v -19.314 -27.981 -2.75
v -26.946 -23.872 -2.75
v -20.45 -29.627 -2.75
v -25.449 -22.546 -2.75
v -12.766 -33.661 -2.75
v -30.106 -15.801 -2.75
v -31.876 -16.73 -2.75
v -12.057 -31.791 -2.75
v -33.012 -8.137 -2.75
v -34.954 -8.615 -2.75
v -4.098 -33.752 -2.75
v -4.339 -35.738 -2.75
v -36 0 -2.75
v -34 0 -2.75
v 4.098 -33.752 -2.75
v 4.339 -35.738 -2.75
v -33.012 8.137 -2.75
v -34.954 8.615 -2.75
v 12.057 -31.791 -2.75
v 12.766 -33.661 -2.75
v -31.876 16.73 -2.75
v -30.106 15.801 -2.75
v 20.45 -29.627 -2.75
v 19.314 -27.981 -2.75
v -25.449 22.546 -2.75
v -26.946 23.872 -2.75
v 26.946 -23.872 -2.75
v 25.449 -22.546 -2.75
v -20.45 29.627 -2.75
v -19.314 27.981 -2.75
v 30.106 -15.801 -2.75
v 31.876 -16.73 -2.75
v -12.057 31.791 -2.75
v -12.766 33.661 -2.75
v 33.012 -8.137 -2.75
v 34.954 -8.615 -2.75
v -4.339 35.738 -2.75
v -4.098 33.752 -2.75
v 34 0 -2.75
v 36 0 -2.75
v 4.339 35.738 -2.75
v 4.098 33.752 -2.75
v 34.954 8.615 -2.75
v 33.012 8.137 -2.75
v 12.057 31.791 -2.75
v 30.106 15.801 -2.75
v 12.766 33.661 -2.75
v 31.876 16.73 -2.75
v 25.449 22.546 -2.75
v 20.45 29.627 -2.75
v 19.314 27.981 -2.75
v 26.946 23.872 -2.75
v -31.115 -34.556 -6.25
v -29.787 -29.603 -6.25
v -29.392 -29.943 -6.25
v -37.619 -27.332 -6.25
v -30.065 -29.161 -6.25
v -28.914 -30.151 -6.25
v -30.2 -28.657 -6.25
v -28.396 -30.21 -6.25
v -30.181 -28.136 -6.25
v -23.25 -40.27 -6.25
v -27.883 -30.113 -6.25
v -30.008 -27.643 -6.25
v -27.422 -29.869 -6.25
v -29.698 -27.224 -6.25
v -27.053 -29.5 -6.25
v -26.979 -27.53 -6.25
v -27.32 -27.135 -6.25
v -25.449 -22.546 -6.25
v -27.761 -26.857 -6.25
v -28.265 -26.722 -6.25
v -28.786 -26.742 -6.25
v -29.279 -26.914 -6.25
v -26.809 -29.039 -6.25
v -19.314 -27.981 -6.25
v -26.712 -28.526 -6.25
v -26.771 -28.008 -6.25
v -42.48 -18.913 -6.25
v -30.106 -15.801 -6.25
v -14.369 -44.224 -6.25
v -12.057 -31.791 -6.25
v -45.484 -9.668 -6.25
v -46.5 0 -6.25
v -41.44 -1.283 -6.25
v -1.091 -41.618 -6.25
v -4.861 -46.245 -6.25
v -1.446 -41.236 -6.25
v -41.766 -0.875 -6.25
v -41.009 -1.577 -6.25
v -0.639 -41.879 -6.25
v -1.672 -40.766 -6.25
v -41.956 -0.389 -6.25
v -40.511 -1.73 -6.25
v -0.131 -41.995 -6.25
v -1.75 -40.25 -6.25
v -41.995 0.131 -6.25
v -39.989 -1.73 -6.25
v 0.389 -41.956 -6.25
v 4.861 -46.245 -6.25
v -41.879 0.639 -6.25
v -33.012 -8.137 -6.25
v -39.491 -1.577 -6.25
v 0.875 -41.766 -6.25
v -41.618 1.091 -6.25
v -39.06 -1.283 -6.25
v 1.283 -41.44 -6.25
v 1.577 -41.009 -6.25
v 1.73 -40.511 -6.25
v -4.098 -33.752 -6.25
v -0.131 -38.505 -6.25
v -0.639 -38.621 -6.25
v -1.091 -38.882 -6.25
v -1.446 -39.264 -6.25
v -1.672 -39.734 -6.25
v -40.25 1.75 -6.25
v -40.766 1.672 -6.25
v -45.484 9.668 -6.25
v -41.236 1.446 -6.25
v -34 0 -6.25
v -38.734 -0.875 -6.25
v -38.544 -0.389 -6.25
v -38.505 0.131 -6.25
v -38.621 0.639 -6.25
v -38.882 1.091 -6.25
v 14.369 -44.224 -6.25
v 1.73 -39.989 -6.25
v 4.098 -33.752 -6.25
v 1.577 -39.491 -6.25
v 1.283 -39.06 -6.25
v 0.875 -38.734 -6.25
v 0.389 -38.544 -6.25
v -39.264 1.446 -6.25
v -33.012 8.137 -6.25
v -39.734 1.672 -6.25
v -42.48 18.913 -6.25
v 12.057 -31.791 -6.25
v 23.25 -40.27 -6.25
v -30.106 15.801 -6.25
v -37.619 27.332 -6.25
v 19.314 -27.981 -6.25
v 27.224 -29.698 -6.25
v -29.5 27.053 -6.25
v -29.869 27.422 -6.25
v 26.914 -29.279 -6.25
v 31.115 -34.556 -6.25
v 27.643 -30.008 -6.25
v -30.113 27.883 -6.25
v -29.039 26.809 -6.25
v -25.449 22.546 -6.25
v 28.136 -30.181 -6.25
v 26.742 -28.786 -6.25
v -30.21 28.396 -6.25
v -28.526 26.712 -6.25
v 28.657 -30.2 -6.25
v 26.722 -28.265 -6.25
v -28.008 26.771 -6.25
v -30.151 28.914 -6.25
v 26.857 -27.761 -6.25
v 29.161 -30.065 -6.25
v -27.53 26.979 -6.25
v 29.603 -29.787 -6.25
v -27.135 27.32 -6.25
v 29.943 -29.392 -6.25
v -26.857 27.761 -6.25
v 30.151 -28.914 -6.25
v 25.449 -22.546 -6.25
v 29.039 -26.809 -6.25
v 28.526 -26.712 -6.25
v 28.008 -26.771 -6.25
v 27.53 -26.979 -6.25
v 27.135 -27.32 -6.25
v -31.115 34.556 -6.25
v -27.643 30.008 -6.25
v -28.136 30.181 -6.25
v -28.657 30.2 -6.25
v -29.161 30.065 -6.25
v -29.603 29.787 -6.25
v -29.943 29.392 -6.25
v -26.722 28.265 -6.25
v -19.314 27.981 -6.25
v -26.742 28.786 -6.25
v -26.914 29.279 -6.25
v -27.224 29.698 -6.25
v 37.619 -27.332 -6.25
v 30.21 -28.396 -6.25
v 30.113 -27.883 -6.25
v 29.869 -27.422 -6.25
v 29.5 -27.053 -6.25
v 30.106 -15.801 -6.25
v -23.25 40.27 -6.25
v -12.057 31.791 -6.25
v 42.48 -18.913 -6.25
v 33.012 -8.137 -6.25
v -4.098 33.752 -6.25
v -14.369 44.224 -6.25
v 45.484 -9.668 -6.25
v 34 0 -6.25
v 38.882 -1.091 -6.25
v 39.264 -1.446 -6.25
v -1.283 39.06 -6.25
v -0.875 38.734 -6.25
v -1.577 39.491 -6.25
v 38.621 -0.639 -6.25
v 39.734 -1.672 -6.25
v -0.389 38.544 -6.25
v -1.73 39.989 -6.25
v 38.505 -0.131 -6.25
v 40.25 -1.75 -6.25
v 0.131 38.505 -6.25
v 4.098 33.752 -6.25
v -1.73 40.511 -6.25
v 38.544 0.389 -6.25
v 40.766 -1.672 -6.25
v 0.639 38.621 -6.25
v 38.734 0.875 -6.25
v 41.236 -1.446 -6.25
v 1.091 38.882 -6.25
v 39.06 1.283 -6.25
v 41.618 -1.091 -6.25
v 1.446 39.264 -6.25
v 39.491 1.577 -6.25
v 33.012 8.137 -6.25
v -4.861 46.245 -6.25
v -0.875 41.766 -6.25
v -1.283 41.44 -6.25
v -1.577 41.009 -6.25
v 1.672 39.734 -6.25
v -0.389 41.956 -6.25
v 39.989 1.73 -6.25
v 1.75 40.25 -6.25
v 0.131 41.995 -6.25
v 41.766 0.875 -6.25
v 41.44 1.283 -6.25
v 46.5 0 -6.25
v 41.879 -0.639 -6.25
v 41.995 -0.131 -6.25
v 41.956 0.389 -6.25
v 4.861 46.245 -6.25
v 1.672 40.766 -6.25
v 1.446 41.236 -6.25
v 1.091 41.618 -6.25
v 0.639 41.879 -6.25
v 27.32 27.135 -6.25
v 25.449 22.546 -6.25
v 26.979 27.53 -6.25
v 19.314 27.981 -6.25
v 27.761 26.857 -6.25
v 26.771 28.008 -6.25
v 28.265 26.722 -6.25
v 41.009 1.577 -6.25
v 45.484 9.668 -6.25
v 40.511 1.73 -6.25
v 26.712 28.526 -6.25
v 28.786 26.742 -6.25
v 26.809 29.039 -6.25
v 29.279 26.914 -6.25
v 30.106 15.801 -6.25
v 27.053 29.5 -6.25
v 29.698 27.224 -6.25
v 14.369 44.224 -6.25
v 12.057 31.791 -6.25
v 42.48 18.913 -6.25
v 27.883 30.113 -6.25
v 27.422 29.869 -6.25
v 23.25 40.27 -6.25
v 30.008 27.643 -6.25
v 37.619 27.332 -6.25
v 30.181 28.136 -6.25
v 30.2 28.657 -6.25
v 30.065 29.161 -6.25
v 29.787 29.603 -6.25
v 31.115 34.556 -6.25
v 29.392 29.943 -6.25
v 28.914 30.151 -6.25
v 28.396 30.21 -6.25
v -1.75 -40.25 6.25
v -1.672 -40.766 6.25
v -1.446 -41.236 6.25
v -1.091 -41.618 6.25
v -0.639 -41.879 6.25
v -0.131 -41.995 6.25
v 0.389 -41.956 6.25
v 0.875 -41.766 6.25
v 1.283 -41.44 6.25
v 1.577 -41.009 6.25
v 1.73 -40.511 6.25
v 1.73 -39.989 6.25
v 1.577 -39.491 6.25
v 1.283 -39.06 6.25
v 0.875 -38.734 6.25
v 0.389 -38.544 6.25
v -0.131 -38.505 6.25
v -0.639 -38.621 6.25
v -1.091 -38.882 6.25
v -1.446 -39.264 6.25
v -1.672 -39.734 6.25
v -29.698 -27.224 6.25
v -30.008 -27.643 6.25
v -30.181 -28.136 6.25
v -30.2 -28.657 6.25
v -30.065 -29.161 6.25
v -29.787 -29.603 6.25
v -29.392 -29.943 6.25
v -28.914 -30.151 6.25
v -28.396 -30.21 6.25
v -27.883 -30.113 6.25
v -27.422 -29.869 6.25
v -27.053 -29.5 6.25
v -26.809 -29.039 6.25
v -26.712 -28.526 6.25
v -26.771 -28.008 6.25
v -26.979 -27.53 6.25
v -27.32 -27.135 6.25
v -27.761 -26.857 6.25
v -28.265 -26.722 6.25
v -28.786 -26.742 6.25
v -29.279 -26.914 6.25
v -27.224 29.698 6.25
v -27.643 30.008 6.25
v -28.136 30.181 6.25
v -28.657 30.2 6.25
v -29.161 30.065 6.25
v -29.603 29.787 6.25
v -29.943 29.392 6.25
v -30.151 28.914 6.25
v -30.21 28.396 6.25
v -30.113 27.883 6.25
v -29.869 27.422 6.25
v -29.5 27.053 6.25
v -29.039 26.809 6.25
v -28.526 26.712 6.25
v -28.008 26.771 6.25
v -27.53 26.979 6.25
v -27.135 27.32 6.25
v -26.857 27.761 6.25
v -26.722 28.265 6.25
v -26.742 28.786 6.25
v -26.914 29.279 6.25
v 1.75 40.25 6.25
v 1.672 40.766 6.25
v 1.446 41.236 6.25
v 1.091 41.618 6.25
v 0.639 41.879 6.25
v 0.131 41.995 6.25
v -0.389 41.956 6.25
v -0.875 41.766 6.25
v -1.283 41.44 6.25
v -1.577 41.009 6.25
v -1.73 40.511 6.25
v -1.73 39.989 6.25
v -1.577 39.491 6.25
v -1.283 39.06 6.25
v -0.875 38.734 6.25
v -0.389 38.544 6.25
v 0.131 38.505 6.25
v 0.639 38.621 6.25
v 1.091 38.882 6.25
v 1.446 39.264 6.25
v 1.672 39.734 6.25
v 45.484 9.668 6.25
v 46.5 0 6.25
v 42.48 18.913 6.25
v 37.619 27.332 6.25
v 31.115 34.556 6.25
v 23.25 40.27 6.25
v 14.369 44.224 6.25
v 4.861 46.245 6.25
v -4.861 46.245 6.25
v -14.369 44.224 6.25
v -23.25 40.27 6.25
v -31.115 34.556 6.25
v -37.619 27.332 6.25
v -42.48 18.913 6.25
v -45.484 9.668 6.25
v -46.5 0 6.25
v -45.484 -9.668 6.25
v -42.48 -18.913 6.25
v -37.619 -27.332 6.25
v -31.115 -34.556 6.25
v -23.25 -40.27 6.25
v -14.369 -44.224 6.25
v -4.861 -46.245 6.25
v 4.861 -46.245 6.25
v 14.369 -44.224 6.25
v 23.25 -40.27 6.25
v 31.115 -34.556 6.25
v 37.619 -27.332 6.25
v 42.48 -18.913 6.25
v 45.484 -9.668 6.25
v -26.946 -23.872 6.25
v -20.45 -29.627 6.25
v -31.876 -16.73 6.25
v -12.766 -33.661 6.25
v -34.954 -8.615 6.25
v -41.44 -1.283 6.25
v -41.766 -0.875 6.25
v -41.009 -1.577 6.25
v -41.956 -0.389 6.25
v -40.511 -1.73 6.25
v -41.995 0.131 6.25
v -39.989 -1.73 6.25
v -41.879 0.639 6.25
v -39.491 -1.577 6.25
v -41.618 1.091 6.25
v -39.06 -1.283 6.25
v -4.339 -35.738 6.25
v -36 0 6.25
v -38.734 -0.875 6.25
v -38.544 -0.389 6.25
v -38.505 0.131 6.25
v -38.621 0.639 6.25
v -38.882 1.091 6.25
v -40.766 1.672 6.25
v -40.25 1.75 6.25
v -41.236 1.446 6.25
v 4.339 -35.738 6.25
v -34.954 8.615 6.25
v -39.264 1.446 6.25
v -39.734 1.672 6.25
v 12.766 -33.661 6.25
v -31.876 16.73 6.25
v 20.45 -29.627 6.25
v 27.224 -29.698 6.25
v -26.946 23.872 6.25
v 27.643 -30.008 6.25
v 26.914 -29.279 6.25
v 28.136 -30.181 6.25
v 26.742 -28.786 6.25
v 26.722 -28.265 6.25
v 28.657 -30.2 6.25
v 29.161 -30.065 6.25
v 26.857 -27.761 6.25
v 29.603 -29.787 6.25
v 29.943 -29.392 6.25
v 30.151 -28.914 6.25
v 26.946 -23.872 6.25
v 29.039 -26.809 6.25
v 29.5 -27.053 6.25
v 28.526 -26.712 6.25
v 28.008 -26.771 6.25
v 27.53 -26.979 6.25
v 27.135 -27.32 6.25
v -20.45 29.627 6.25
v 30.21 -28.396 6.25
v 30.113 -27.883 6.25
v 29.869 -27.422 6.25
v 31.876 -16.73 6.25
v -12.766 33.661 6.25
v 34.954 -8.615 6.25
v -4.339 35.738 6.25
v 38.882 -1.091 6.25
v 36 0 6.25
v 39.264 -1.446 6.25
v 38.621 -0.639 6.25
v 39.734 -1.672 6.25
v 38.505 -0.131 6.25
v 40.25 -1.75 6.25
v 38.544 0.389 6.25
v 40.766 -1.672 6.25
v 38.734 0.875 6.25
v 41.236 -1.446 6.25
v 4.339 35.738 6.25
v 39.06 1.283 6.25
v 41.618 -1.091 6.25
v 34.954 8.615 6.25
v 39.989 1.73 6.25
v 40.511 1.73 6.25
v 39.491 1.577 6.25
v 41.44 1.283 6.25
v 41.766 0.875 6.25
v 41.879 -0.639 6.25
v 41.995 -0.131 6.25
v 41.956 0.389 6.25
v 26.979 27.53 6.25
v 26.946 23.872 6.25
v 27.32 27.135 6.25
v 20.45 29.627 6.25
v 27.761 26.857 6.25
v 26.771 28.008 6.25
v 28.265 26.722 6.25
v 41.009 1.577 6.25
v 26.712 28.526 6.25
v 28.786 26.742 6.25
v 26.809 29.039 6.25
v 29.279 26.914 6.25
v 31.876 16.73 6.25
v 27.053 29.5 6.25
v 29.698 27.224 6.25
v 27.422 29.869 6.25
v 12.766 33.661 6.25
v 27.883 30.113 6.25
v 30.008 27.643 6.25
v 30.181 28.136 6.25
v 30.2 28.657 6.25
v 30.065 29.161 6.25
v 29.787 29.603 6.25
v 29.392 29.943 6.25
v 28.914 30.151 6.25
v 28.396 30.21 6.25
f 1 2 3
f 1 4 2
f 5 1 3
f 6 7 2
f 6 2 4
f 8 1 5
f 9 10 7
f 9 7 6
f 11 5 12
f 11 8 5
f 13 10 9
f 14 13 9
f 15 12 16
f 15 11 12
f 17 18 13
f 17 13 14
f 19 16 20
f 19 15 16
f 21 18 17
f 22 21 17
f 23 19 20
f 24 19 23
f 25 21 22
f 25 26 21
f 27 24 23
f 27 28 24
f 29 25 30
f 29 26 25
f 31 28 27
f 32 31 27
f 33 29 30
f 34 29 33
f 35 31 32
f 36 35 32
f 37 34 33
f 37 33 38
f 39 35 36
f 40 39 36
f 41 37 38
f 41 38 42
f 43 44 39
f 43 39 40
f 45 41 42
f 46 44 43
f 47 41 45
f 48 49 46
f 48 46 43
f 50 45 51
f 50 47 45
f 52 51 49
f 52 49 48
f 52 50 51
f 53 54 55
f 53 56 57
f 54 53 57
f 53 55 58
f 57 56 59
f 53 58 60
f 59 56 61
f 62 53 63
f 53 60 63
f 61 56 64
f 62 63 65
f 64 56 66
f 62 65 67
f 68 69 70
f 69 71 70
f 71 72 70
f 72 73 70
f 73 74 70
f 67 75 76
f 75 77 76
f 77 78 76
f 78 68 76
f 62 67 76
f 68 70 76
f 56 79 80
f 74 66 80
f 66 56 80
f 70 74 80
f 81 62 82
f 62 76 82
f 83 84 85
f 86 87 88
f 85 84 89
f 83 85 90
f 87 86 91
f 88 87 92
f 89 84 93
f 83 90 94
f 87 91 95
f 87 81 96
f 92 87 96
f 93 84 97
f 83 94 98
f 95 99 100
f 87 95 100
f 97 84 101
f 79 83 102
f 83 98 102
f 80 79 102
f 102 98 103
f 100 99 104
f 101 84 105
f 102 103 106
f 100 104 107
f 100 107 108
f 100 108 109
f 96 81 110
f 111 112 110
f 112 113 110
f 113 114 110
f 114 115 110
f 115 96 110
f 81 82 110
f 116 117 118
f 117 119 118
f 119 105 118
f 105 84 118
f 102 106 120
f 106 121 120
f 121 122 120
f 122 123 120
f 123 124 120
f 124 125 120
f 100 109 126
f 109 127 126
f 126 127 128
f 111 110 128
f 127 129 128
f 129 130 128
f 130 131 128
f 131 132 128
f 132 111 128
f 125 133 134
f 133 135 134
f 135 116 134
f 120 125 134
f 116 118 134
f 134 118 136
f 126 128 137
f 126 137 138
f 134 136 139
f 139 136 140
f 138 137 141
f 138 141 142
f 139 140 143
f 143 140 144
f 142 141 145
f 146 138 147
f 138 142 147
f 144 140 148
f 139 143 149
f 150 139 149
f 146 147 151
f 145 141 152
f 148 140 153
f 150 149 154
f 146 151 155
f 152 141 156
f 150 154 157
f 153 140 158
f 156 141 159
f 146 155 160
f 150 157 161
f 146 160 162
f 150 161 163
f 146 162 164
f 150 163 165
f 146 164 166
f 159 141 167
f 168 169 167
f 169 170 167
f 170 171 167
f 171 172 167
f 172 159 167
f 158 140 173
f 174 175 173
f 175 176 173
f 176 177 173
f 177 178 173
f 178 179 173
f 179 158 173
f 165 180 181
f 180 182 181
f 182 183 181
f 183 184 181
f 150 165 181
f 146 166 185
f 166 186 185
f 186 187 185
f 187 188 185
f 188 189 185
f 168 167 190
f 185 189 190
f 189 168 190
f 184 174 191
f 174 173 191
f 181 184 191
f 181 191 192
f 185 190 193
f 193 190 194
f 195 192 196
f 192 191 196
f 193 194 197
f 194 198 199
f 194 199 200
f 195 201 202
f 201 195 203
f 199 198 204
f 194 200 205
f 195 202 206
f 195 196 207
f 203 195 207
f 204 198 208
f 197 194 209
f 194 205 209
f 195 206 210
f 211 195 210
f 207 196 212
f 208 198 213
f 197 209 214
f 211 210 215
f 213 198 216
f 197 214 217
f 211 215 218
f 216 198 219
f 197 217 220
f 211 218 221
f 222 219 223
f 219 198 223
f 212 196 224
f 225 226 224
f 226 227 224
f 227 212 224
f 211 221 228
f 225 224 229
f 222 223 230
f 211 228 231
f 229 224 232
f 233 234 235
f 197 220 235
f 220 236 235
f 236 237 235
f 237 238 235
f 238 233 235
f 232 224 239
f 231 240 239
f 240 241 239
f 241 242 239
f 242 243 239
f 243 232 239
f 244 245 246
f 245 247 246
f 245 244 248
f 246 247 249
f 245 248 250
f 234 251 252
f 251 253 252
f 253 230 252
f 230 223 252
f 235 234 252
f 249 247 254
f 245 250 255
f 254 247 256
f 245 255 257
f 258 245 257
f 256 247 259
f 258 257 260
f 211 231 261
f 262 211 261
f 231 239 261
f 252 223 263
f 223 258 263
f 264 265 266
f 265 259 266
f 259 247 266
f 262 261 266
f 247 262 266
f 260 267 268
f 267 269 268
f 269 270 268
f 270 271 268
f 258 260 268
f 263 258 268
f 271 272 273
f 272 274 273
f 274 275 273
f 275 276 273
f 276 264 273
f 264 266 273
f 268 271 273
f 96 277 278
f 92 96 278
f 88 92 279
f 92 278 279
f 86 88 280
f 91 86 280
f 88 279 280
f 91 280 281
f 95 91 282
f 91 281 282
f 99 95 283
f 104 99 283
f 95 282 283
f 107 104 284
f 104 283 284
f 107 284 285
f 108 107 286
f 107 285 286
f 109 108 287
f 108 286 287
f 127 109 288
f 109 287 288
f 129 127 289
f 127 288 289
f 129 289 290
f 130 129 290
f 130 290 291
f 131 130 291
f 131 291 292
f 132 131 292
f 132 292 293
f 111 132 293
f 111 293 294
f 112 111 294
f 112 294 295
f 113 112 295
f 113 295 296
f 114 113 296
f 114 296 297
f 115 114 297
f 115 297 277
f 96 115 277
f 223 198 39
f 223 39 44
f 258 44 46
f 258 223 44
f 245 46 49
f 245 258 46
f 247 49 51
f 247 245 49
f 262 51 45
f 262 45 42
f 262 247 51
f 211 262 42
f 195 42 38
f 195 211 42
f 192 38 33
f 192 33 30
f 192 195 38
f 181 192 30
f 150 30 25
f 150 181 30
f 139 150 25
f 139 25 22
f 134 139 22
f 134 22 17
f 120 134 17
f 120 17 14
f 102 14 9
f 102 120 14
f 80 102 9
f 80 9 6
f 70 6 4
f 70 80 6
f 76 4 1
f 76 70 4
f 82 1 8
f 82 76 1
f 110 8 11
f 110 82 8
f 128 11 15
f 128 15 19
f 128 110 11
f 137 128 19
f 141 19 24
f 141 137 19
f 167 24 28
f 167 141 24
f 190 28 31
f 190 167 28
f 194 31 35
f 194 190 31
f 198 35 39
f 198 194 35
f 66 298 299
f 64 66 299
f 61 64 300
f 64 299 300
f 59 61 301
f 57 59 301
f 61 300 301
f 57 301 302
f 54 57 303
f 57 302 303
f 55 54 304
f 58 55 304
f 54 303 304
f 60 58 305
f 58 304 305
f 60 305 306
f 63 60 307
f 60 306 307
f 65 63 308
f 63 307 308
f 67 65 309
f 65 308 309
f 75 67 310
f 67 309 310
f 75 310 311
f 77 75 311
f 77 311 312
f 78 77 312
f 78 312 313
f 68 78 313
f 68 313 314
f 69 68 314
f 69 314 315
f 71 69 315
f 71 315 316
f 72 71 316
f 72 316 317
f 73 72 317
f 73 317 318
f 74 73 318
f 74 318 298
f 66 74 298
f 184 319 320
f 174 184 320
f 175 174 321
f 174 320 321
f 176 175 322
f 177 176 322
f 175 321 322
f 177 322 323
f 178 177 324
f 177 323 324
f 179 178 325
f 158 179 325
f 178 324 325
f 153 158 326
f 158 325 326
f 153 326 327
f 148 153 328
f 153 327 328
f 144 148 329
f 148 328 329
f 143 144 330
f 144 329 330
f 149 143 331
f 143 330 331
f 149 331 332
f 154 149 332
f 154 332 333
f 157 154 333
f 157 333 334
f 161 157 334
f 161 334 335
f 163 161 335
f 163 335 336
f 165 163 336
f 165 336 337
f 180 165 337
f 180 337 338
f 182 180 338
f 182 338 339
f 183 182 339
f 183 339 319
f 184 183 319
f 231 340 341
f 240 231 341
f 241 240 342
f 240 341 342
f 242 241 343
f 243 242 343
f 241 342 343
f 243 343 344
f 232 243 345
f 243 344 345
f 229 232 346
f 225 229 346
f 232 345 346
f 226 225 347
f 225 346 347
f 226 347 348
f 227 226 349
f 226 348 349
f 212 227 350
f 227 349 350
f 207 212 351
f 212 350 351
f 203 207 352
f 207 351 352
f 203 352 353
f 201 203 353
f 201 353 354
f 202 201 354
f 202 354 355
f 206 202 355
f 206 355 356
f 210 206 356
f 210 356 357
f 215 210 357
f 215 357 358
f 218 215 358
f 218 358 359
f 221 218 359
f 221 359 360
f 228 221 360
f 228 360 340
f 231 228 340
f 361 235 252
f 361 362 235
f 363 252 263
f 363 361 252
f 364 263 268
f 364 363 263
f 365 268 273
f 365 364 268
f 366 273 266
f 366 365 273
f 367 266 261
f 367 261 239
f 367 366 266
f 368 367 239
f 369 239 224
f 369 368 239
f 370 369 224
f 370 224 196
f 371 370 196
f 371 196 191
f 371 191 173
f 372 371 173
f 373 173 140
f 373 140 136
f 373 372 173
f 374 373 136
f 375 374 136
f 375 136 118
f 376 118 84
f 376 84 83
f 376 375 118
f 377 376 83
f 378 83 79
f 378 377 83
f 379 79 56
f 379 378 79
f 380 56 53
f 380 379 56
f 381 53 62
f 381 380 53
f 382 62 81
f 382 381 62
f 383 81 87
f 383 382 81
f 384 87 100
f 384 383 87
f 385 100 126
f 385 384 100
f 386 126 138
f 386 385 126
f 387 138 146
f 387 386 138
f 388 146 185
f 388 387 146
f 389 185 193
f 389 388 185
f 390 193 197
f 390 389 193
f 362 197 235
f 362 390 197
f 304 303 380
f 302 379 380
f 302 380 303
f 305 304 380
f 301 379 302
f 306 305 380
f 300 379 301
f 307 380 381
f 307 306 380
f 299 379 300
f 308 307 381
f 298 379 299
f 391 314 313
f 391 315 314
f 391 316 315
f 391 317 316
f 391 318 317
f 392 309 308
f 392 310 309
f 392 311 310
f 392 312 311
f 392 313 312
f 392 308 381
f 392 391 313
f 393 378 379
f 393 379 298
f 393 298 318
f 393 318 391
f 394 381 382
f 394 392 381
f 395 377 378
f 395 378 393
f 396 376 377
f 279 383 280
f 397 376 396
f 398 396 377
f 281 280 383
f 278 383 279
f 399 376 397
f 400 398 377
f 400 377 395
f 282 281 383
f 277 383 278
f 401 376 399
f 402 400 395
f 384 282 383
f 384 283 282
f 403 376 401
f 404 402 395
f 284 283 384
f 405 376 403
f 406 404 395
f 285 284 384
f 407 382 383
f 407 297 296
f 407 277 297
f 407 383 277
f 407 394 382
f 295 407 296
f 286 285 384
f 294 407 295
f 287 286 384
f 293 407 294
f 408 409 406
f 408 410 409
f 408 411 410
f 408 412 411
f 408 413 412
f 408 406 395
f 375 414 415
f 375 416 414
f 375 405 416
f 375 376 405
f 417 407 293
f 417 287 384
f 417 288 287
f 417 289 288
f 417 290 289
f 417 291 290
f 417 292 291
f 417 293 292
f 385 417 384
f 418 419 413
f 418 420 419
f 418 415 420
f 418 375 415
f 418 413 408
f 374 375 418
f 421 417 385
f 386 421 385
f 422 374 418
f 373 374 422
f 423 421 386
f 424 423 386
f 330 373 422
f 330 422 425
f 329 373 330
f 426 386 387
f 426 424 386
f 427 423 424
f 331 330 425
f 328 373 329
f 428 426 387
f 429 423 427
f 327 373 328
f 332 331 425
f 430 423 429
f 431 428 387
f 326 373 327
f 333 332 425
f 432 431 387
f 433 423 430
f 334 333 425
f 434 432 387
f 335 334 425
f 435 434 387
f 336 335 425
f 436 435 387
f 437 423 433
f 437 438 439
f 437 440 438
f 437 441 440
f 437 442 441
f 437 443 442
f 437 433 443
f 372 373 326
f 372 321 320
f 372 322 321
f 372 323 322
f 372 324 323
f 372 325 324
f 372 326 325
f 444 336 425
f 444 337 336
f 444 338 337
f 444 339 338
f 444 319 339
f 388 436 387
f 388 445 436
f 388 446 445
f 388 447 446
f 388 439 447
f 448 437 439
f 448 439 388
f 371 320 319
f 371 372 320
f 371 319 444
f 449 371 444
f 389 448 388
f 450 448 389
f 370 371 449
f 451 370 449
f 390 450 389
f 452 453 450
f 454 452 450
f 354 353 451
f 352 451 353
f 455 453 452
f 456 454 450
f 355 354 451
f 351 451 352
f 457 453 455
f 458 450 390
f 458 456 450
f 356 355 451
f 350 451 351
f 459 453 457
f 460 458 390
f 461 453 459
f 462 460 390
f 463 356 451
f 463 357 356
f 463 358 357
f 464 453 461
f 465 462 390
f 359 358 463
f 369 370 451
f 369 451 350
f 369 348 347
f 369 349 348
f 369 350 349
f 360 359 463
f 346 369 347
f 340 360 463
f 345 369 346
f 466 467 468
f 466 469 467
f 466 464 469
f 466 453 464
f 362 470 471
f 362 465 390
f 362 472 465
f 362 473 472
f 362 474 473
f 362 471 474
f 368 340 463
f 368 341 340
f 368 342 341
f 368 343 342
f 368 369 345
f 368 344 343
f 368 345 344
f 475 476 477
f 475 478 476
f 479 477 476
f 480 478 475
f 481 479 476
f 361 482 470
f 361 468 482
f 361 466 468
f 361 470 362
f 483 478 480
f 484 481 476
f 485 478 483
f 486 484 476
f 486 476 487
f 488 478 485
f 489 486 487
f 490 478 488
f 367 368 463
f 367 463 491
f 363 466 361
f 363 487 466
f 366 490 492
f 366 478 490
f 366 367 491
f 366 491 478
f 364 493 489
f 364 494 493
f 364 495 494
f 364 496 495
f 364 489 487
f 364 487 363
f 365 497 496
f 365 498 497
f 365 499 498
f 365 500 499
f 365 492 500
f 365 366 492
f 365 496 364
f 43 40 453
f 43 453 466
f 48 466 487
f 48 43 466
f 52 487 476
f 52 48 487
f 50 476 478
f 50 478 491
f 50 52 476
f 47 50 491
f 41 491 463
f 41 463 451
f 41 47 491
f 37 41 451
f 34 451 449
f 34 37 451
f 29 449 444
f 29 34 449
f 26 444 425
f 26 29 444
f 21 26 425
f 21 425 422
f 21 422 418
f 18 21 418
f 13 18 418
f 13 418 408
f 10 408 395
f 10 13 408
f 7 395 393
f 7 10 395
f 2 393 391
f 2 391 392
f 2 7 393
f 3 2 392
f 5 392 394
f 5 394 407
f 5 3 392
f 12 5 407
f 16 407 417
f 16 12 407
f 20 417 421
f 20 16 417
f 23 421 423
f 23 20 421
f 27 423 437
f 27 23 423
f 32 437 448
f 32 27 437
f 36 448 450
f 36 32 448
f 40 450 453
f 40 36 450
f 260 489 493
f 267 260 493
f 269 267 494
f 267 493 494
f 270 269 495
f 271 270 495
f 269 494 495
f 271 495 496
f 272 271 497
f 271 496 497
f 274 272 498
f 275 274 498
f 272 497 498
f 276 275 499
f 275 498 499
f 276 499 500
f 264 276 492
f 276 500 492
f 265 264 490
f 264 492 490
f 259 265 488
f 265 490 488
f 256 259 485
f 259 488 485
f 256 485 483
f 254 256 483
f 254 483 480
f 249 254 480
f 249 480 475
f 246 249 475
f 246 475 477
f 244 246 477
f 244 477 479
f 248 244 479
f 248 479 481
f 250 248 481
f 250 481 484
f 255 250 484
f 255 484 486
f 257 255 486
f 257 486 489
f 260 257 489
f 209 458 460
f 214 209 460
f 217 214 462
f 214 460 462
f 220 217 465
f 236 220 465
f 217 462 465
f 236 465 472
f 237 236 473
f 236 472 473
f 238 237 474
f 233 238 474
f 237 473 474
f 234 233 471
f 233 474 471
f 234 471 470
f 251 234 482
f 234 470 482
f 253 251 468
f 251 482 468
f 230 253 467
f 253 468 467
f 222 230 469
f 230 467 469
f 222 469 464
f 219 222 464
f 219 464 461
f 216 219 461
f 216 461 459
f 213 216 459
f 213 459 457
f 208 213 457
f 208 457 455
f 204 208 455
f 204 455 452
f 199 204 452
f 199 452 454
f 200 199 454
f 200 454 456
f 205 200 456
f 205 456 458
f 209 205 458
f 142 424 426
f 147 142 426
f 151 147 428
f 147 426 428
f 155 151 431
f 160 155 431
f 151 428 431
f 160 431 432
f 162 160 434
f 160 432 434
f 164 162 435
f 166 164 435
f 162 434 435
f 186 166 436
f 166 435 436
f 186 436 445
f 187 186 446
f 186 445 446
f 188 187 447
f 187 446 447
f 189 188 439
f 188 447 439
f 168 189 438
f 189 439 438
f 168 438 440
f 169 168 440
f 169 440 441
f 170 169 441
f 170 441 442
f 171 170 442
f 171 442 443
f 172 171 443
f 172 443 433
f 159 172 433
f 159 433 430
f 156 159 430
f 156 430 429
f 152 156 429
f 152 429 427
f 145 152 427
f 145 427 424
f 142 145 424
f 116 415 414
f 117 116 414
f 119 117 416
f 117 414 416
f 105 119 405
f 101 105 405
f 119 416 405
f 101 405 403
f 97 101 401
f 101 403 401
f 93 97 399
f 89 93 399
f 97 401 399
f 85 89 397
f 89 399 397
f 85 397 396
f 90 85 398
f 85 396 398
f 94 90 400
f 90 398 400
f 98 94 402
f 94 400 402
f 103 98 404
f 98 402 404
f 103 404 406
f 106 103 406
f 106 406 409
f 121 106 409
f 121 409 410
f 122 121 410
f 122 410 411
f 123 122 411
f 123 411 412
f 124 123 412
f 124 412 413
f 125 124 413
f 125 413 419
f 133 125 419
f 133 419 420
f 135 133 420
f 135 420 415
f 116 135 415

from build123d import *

# Parameters (mm, degrees)
SKETCH1_R           = 46.5
SKETCH1_R_2         = 36
BOSS_EXTRUDE1_DEPTH = 6.25
SKETCH4_R           = 36
SKETCH4_R_2         = 34
BOSS_EXTRUDE2_DEPTH = 3.5
SKETCH3_R           = 1.75
CUT_EXTRUDE1_DEPTH  = 67.938404522
CIRPATTERN1_COUNT   = 8


with BuildPart() as part:
    # Sketch1 → Boss-Extrude1 (new, symmetric)
    with BuildSketch(Plane.XY):
        Circle(SKETCH1_R)
        Circle(SKETCH1_R_2, mode=Mode.SUBTRACT)
    extrude(amount=BOSS_EXTRUDE1_DEPTH, both=True)

    # Sketch4 → Boss-Extrude2 (add)
    with BuildSketch(Plane.XY.offset(-6.25)):
        Circle(SKETCH4_R)
        Circle(SKETCH4_R_2, mode=Mode.SUBTRACT)
    extrude(amount=BOSS_EXTRUDE2_DEPTH)

    # Sketch3 → Cut-Extrude1 (cut, through all)
    with BuildSketch(Plane.XY.offset(6.25)):
        with Locations((0, 40.25)):
            Circle(SKETCH3_R)
    cut_extrude1 = extrude(amount=-CUT_EXTRUDE1_DEPTH, mode=Mode.SUBTRACT)

    # CirPattern1: Cut-Extrude1 ×8 about axis
    cirpattern1_axis = Axis((0, 0, 0), (0, 0, 1))
    for i in range(1, CIRPATTERN1_COUNT):
        add(cut_extrude1.rotate(cirpattern1_axis, i * 360 / CIRPATTERN1_COUNT), mode=Mode.SUBTRACT)


solid = part.part
